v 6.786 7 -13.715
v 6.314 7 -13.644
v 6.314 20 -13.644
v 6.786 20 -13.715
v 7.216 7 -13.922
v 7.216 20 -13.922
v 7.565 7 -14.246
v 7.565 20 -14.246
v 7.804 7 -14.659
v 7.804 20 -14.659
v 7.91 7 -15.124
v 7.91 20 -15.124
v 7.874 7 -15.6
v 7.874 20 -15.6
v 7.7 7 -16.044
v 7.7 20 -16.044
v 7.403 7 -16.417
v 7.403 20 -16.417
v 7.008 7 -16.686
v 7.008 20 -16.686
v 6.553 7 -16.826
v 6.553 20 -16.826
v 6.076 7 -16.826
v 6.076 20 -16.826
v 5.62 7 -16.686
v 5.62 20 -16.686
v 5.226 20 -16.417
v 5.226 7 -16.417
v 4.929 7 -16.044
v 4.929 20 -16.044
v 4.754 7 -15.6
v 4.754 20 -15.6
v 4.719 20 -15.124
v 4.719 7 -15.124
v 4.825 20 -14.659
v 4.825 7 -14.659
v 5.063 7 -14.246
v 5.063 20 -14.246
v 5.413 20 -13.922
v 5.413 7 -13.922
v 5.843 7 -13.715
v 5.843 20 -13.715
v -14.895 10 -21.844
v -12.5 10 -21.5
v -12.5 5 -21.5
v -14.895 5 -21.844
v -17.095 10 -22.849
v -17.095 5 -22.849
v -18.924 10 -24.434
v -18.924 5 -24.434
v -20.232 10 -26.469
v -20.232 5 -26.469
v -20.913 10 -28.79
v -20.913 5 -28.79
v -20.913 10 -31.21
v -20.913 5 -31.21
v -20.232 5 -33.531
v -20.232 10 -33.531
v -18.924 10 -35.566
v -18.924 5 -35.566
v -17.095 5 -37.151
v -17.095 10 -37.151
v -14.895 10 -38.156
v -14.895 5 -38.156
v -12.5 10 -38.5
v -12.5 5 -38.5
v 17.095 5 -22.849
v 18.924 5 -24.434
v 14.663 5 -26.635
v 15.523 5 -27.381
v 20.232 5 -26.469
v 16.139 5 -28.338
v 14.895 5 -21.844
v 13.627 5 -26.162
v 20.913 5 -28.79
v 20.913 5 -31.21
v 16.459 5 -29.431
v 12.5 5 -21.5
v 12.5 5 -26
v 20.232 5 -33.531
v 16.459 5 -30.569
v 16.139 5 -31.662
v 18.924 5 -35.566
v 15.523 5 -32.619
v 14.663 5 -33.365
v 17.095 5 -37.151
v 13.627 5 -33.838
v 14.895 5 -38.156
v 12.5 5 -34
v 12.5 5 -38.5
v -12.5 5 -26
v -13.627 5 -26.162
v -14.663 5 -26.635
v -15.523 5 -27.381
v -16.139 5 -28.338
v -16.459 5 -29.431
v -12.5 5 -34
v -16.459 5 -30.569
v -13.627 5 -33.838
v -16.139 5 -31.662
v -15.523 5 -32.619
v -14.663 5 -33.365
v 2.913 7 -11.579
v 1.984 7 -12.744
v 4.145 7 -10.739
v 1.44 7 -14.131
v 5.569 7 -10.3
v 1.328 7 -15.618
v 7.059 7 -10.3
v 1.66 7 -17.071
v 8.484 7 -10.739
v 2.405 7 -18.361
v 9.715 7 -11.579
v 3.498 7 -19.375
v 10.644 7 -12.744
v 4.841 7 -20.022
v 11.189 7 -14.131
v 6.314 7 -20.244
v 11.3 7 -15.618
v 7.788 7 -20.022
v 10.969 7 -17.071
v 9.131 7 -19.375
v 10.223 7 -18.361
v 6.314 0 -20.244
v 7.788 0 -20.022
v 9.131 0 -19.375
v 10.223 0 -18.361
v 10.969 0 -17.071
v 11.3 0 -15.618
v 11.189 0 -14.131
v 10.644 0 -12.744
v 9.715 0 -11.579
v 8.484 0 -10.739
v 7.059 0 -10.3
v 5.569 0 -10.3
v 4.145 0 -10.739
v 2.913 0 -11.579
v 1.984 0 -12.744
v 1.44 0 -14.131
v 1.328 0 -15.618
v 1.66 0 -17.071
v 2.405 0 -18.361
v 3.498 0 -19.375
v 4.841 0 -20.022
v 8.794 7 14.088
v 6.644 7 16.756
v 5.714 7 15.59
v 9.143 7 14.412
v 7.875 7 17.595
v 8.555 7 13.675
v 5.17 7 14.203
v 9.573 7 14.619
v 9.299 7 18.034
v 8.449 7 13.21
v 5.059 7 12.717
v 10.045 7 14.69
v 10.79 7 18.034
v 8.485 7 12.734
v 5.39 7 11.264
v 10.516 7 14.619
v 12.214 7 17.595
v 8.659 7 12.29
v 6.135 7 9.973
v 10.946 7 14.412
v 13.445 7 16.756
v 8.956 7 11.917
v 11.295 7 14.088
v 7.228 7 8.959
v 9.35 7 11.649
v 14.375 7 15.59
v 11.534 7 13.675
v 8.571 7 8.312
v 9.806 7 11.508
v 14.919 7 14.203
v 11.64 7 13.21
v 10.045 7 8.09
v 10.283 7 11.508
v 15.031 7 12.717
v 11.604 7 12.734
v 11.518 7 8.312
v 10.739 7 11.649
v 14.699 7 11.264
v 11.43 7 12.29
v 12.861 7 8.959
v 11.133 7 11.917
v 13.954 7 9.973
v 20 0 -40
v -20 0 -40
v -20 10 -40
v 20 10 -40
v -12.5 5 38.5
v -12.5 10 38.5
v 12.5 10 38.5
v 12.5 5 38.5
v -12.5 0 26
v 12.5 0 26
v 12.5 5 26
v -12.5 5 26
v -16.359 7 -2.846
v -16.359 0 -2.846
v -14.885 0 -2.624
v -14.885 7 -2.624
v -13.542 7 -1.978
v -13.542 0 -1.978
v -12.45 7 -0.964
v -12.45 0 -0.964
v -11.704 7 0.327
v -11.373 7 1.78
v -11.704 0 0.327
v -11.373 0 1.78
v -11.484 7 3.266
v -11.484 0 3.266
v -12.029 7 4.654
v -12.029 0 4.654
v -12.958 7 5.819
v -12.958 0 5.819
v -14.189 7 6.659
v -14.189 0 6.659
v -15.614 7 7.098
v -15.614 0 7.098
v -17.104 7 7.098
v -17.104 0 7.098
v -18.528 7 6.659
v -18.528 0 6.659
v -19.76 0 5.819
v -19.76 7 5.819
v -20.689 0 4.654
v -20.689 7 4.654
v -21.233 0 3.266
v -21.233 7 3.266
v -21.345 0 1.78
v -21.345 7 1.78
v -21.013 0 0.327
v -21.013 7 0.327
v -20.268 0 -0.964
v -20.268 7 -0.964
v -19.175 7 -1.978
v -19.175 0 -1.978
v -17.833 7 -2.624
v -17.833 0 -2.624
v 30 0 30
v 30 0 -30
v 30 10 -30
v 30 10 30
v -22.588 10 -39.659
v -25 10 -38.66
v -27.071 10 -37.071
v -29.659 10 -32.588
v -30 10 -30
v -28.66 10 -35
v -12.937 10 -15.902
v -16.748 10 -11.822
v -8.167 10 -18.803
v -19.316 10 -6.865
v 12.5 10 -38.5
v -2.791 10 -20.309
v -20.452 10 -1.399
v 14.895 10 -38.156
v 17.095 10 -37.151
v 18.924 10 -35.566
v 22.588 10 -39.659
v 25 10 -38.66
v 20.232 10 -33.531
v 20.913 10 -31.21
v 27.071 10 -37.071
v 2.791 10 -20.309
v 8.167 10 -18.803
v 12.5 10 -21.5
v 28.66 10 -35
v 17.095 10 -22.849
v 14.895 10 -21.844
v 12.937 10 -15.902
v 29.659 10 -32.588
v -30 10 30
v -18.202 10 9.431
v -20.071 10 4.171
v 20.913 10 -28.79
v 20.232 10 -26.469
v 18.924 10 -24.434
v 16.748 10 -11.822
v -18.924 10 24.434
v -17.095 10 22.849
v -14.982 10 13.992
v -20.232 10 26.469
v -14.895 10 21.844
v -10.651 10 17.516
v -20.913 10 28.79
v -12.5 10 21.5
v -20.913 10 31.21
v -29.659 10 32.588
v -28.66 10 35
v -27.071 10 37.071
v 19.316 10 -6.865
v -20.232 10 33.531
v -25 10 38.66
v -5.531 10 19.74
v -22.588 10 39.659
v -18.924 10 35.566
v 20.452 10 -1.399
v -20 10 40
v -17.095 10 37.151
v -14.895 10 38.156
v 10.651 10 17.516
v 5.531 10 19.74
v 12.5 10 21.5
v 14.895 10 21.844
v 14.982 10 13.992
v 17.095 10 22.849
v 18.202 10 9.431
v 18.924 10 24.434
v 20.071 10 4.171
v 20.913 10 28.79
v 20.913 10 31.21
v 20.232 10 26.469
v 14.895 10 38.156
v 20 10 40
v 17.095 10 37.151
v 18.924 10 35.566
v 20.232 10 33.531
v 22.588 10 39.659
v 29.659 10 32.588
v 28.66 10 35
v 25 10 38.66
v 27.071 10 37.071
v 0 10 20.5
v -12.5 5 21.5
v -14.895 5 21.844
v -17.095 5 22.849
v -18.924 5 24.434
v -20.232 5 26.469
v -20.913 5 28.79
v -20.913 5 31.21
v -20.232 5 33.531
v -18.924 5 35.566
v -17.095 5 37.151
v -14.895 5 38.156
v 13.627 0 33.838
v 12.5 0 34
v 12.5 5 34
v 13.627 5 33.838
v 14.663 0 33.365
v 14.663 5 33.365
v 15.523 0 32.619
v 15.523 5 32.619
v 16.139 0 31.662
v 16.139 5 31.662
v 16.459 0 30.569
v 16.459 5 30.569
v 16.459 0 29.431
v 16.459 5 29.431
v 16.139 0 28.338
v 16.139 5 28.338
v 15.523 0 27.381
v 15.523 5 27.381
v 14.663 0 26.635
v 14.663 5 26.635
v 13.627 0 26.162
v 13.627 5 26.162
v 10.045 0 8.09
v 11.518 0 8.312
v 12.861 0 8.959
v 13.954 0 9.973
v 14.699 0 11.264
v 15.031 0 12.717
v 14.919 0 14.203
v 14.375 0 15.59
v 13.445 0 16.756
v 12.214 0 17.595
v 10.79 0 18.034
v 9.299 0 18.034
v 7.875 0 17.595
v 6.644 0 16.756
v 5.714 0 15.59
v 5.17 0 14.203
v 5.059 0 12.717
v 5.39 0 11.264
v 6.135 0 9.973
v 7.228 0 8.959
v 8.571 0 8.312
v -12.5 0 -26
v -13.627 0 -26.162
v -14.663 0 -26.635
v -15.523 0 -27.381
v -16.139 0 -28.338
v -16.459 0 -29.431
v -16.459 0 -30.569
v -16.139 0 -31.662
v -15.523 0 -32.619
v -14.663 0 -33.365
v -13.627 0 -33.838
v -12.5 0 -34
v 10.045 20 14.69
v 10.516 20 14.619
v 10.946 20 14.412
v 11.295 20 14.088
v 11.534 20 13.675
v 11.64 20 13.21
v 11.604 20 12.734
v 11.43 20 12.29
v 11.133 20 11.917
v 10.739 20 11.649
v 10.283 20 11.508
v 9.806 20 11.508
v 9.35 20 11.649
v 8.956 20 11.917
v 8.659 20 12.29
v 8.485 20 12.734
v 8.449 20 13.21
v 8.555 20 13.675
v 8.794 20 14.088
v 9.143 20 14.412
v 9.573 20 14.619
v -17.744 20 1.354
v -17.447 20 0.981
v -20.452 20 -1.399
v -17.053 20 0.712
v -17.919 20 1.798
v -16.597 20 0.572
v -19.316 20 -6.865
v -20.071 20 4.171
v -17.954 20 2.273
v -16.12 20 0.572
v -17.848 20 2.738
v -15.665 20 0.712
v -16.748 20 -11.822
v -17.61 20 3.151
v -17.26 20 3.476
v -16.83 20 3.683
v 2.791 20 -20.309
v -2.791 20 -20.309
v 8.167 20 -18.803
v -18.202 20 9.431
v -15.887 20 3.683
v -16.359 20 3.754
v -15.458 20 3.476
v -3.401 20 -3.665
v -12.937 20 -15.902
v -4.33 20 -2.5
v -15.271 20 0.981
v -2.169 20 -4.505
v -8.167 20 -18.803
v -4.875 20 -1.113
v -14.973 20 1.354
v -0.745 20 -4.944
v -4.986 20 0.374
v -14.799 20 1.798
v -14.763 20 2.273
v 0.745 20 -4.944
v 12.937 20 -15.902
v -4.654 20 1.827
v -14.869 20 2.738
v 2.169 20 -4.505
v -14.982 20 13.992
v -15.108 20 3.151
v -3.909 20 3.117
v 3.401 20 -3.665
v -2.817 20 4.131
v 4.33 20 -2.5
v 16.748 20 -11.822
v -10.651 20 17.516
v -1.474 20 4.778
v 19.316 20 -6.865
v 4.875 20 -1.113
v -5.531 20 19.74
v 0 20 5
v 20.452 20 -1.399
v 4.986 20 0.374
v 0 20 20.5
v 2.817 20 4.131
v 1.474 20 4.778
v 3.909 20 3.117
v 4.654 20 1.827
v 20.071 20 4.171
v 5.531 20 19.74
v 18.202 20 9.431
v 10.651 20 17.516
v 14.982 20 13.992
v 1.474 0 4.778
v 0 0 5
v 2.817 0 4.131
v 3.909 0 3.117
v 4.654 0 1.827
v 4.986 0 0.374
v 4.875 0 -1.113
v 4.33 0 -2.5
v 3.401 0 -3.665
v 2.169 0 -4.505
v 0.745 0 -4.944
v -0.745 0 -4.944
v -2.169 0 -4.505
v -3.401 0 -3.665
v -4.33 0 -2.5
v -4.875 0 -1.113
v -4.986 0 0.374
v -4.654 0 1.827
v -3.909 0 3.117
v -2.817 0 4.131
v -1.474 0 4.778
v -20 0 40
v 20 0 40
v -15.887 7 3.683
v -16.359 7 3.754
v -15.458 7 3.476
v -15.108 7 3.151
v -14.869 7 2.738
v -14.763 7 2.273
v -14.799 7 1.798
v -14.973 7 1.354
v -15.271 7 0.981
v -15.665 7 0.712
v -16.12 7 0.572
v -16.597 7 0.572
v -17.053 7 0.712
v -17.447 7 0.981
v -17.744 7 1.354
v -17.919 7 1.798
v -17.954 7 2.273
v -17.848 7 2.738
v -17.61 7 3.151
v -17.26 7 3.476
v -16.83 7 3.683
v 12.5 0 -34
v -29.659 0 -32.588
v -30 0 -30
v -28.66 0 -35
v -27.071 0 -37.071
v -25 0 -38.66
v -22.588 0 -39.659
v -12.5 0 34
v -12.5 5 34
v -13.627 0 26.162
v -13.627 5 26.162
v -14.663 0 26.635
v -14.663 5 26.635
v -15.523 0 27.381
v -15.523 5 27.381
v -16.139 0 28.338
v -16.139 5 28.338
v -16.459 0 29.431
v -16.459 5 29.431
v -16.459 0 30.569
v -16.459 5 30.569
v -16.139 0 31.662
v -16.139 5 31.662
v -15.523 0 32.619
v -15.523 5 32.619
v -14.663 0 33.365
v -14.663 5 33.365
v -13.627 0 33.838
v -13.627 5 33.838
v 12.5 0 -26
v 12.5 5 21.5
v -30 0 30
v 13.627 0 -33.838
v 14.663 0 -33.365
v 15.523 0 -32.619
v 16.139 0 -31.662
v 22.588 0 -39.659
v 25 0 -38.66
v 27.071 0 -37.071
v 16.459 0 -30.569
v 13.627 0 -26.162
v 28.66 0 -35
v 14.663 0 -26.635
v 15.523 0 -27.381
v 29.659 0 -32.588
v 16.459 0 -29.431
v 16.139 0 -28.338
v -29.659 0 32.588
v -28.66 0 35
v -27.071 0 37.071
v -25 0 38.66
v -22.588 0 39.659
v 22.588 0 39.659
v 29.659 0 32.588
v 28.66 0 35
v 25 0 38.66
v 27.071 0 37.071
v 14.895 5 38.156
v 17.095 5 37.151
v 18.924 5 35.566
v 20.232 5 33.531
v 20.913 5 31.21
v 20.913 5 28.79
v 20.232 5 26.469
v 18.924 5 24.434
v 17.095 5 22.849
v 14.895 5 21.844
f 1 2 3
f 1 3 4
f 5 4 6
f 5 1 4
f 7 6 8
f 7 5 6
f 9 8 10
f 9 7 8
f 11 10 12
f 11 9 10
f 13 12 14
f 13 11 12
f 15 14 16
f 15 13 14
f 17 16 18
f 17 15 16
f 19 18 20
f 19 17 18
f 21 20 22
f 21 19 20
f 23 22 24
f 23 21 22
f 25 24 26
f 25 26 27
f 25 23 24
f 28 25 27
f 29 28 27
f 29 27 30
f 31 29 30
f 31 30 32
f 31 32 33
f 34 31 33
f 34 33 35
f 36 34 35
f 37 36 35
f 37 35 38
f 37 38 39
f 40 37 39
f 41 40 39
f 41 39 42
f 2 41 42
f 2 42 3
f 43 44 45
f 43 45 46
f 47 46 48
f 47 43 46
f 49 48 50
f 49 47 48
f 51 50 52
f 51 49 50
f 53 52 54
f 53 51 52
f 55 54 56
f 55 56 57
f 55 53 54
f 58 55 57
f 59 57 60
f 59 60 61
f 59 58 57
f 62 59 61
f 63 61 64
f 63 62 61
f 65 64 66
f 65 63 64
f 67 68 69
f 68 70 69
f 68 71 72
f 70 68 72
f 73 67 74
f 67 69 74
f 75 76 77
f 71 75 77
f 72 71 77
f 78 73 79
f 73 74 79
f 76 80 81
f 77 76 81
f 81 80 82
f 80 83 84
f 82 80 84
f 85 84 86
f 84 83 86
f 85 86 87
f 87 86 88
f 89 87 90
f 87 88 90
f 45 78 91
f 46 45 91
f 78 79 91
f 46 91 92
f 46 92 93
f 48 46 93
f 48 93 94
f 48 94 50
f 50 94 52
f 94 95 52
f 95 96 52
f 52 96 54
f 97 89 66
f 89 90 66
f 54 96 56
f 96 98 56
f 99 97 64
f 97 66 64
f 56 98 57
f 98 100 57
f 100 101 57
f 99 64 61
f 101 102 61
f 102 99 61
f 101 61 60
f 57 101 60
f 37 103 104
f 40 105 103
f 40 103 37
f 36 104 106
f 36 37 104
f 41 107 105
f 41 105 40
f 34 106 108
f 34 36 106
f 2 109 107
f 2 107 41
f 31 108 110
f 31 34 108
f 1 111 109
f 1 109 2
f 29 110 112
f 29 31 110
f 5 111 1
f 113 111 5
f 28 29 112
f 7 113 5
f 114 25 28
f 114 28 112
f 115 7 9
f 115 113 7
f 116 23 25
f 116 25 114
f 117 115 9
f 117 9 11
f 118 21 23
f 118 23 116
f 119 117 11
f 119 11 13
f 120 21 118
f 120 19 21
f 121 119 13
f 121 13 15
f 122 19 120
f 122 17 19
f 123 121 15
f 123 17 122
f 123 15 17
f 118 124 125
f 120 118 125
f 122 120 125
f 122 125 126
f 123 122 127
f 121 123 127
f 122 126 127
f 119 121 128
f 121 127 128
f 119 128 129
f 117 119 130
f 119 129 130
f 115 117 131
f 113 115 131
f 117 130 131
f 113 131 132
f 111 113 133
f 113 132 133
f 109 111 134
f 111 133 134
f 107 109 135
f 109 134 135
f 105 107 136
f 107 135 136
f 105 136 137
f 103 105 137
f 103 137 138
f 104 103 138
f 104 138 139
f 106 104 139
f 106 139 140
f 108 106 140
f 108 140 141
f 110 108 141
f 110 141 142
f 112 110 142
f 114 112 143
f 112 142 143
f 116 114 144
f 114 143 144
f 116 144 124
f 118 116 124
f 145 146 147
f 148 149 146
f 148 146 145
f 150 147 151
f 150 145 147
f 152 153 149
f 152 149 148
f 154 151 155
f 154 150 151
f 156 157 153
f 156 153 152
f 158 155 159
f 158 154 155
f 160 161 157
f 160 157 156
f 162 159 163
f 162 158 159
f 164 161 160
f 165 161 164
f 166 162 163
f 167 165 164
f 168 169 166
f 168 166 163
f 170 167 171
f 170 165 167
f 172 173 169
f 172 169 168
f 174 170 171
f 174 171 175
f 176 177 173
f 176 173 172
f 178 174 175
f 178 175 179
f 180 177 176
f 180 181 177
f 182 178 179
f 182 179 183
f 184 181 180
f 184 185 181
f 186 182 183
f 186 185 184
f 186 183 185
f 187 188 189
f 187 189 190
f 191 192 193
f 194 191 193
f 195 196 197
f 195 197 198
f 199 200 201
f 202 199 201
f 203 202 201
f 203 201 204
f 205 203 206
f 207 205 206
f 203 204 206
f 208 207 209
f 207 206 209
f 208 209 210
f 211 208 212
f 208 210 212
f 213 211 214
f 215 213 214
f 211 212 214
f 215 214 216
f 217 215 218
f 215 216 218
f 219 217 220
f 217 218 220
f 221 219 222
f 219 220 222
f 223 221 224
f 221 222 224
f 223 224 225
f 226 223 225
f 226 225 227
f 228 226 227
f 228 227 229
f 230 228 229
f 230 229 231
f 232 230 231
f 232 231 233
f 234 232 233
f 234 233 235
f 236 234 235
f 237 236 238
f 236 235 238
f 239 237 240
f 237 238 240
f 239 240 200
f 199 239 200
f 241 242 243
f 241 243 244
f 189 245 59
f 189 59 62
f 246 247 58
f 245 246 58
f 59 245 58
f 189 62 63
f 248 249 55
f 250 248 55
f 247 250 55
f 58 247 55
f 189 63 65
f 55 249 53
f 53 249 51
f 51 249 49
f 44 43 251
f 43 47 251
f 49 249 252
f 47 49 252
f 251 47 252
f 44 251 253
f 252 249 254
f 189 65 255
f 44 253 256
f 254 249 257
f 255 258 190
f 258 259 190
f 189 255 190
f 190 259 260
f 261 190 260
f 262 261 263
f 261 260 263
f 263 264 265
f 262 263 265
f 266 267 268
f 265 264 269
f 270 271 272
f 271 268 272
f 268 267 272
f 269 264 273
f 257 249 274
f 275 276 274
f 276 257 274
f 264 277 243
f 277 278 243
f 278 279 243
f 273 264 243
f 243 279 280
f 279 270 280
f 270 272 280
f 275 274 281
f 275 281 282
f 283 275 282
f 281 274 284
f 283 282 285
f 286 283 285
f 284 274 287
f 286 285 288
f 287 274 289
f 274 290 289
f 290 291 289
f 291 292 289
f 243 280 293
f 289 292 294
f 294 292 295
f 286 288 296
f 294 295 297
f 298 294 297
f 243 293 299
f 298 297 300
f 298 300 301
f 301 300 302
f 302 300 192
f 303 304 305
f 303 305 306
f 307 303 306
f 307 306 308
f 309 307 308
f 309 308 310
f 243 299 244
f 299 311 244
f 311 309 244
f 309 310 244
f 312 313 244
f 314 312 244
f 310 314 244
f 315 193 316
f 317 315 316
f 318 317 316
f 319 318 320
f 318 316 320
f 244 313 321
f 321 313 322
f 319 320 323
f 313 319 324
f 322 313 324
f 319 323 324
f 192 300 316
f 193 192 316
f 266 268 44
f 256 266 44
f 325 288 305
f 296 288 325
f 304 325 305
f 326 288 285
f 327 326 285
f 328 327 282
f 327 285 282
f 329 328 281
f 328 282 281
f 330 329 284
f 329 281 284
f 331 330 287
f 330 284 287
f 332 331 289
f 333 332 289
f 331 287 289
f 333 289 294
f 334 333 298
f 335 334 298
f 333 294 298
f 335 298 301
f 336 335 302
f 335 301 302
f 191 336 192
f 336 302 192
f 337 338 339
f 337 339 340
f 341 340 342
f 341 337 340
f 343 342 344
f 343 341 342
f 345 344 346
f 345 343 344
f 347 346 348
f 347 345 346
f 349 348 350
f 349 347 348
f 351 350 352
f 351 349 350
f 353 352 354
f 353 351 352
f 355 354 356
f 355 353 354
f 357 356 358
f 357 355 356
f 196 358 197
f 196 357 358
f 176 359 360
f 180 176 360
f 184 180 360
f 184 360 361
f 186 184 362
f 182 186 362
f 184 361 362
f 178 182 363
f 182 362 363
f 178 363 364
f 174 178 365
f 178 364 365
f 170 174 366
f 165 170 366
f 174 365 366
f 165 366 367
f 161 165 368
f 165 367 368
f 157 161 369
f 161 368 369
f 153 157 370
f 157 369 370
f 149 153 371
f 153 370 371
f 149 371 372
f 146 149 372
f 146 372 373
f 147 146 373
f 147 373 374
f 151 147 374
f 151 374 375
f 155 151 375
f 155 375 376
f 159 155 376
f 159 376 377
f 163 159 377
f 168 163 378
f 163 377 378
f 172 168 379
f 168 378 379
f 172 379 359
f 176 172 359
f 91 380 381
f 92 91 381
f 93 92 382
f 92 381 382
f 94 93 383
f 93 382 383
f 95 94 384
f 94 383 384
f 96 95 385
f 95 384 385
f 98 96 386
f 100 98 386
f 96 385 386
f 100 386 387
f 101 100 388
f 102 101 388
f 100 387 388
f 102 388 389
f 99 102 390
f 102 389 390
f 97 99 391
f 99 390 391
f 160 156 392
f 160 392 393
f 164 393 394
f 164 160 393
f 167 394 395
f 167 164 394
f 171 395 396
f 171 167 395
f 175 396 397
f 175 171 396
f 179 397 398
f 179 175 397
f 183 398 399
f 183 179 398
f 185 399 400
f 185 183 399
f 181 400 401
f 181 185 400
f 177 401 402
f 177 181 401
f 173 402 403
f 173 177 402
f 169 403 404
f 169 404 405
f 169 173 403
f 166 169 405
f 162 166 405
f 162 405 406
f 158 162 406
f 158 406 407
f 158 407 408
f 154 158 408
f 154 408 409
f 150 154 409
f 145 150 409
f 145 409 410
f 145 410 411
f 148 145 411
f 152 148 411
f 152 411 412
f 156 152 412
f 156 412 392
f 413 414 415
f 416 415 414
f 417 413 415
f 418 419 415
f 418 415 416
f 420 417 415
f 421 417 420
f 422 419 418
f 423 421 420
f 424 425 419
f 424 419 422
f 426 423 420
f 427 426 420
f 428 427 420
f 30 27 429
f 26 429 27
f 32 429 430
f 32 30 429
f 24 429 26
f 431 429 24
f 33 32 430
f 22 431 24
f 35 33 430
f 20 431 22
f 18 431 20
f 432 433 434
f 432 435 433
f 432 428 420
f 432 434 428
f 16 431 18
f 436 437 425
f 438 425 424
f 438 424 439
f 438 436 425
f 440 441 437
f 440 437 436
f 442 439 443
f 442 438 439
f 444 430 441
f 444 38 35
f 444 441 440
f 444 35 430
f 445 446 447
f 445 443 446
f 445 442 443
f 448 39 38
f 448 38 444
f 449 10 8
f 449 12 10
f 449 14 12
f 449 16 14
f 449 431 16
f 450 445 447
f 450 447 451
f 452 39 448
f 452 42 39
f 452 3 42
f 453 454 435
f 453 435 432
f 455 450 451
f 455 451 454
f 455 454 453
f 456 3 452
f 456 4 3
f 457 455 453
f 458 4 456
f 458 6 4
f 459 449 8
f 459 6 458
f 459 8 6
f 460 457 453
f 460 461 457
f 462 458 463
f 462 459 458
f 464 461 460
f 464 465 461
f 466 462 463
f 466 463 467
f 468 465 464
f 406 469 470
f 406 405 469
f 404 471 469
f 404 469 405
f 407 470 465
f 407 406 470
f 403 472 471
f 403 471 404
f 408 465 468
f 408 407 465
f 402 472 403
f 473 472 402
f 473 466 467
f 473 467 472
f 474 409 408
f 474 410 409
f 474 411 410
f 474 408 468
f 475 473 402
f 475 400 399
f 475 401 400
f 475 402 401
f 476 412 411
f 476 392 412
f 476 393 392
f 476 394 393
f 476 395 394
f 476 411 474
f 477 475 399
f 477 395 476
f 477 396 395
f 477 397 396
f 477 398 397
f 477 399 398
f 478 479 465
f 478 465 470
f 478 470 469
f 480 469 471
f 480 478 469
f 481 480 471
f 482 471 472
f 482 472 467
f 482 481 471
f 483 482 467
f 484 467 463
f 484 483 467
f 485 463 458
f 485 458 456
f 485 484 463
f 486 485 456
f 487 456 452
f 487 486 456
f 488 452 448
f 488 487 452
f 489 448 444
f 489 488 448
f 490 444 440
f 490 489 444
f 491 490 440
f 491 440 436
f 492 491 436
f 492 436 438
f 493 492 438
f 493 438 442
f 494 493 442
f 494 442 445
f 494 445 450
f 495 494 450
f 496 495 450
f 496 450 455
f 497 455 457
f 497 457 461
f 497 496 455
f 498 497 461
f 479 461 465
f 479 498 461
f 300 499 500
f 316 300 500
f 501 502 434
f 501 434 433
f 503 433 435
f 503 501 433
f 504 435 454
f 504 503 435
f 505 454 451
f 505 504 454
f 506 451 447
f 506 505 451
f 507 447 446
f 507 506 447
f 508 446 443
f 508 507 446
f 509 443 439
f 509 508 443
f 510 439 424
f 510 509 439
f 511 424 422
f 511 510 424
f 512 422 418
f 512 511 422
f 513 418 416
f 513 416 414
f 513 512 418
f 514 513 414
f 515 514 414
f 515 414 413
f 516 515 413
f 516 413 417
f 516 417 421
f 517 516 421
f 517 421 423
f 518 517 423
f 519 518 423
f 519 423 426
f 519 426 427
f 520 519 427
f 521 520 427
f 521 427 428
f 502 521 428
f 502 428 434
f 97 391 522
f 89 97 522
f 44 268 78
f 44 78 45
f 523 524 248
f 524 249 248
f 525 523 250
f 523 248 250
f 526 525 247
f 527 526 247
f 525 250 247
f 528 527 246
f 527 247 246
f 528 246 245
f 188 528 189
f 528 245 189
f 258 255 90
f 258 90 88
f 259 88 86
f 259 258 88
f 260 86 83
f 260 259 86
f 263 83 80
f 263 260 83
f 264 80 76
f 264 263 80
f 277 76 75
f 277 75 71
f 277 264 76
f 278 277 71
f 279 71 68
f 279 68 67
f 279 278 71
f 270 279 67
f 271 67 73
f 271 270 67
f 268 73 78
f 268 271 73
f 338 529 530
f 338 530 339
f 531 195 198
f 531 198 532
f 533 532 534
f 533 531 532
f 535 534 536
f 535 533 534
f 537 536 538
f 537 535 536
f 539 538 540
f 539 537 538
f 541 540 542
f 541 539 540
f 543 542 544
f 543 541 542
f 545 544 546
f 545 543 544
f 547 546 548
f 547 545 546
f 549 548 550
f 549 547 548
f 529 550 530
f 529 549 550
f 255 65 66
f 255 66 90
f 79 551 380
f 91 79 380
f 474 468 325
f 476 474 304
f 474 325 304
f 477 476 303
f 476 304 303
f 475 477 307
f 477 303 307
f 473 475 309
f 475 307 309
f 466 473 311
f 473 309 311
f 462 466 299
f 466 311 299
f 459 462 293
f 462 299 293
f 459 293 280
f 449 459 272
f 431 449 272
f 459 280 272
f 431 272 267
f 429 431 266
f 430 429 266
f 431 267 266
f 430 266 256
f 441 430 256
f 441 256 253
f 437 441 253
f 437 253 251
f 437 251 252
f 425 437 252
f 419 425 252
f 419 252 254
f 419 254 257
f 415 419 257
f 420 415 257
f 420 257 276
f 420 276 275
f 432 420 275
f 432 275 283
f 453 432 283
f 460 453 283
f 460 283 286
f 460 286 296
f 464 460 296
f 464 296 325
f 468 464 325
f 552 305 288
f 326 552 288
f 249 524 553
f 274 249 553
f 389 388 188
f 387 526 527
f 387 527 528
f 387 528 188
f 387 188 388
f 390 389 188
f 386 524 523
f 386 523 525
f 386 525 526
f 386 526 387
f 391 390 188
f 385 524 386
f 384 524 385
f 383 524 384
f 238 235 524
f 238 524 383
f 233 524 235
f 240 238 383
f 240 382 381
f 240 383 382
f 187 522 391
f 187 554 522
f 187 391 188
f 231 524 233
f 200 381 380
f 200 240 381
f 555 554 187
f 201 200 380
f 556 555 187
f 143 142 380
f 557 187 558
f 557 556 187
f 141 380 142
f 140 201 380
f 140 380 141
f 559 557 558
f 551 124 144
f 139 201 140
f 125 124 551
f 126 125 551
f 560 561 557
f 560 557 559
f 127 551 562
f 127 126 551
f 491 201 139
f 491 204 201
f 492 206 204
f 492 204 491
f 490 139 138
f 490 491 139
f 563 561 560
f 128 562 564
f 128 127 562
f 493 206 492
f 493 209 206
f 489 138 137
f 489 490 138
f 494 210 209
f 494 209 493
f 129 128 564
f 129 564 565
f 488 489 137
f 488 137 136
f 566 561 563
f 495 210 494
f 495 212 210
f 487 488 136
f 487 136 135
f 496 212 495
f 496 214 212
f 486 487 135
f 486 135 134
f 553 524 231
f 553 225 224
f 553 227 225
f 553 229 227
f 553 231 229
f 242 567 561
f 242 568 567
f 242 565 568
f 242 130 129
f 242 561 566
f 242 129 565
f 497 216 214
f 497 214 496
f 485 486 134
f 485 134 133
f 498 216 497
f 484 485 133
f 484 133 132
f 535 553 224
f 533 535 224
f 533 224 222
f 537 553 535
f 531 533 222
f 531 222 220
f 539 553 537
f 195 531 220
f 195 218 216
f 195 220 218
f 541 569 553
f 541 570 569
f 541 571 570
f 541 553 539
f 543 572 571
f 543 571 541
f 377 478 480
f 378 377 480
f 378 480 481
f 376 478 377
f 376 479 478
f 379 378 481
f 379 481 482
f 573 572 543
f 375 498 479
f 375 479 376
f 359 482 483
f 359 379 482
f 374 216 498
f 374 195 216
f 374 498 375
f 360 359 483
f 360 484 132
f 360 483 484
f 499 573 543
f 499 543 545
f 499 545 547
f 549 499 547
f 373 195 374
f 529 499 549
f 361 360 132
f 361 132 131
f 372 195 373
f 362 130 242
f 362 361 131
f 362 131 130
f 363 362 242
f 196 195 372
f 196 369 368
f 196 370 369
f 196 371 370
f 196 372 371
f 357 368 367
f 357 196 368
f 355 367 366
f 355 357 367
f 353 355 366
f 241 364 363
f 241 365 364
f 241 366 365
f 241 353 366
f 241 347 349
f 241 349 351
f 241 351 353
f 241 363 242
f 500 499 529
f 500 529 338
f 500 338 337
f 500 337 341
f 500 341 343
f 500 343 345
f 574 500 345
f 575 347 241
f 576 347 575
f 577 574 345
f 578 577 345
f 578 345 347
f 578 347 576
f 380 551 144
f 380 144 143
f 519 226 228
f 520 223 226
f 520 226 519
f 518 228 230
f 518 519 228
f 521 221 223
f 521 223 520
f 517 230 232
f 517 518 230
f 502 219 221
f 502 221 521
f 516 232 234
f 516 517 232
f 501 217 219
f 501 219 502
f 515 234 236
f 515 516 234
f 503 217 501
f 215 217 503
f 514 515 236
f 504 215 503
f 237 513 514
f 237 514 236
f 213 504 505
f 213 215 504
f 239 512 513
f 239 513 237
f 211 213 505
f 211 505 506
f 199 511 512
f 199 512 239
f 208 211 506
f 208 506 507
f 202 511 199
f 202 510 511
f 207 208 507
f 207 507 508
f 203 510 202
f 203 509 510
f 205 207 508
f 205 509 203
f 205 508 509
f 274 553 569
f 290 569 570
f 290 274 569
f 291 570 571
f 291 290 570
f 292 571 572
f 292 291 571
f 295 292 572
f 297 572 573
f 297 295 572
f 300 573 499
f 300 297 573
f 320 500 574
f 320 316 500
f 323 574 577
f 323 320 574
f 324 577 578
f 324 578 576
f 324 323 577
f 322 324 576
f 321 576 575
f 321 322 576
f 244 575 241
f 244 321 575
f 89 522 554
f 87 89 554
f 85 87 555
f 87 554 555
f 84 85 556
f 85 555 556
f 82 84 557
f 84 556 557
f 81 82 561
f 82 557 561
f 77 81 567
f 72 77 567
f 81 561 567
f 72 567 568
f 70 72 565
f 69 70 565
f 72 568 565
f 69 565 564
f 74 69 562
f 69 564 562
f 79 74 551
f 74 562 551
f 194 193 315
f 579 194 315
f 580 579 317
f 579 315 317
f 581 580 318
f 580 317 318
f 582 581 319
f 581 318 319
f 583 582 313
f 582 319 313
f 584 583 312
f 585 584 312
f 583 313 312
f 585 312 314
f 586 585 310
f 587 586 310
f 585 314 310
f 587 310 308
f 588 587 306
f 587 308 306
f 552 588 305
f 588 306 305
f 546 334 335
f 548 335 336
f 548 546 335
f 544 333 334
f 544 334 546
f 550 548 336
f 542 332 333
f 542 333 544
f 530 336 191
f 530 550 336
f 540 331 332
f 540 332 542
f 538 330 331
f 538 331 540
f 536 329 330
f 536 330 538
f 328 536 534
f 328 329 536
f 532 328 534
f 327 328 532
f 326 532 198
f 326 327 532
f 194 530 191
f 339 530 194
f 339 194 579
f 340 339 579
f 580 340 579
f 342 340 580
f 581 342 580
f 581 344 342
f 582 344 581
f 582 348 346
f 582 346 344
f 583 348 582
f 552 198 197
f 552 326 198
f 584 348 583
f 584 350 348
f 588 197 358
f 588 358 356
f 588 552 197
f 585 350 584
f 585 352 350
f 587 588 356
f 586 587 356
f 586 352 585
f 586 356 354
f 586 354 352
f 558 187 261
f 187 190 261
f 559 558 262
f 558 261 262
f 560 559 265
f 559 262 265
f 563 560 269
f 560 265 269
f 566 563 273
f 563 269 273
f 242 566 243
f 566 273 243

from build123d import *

# Parameters (mm, degrees)
SKETCH1_R           = 20.5
SKETCH1_R_2         = 1.6
SKETCH1_R_3         = 5
BOSS_EXTRUDE1_DEPTH = 20
SKETCH2_W           = 60
SKETCH2_H           = 80
SKETCH2_R           = 20.5
BOSS_EXTRUDE2_DEPTH = 10
CUT_EXTRUDE1_DEPTH  = 5
FILLET1_R           = 10
SKETCH4_R           = 5
CUT_EXTRUDE2_DEPTH  = 7


with BuildPart() as part:
    # Sketch1 → Boss-Extrude1 (new body)
    with BuildSketch(Plane(origin=(0, 0, 0), x_dir=(1, 0, 0), z_dir=(0, 1, 0))):
        with Locations(Location((0, 0, 0), (0, 0, 270))):
            Circle(SKETCH1_R)
        with Locations(Location((6.314276634, 15.244012286, 0), (0, 0, 270))):
            Circle(SKETCH1_R_2, mode=Mode.SUBTRACT)
        with Locations(Location((10.044563579, -13.090330115, 0), (0, 0, 270))):
            Circle(SKETCH1_R_2, mode=Mode.SUBTRACT)
        with Locations(Location((-16.358840213, -2.153682172, 0), (0, 0, 270))):
            Circle(SKETCH1_R_2, mode=Mode.SUBTRACT)
        with Locations(Location((0, 0, 0), (0, 0, 270))):
            Circle(SKETCH1_R_3, mode=Mode.SUBTRACT)
    extrude(amount=BOSS_EXTRUDE1_DEPTH)

    # Sketch2 → Boss-Extrude2 (add)
    with BuildSketch(Plane.XZ):
        Rectangle(SKETCH2_W, SKETCH2_H)
        with Locations(Location((0, 0, 0), (0, 0, 270))):
            Circle(SKETCH2_R, mode=Mode.SUBTRACT)
        with BuildLine():
            Line((-12.5, 34), (12.5, 34))
            ThreePointArc((12.5, 34), (16.5, 30), (12.5, 26))
            Line((12.5, 26), (-12.5, 26))
            ThreePointArc((-12.5, 26), (-16.5, 30), (-12.5, 34))
        make_face(mode=Mode.SUBTRACT)
        with BuildLine():
            Line((-12.5, -34), (12.5, -34))
            ThreePointArc((12.5, -34), (16.5, -30), (12.5, -26))
            Line((12.5, -26), (-12.5, -26))
            ThreePointArc((-12.5, -26), (-16.5, -30), (-12.5, -34))
        make_face(mode=Mode.SUBTRACT)
    extrude(amount=-BOSS_EXTRUDE2_DEPTH)

    # Sketch3 → Cut-Extrude1 (cut)
    with BuildSketch(Plane(origin=(0, 10, 0), x_dir=(1, 0, 0), z_dir=(0, 1, 0))):
        with BuildLine():
            Line((-12.5, 38.5), (12.5, 38.5))
            ThreePointArc((12.5, 38.5), (21, 30), (12.5, 21.5))
            Line((12.5, 21.5), (-12.5, 21.5))
            ThreePointArc((-12.5, 21.5), (-21, 30), (-12.5, 38.5))
        make_face()
        with BuildLine():
            Line((-12.5, -38.5), (12.5, -38.5))
            ThreePointArc((12.5, -38.5), (21, -30), (12.5, -21.5))
            Line((12.5, -21.5), (-12.5, -21.5))
            ThreePointArc((-12.5, -21.5), (-21, -30), (-12.5, -38.5))
        make_face()
    extrude(amount=-CUT_EXTRUDE1_DEPTH, mode=Mode.SUBTRACT)

    # Fillet1
    fillet1_edges = [part.edges().sort_by_distance(p)[0] for p in [
        (30, 5, 40),
        (30, 5, -40),
        (-30, 5, -40),
        (-30, 5, 40),
    ]]
    fillet(fillet1_edges, radius=FILLET1_R)

    # Sketch4 → Cut-Extrude2 (cut)
    with BuildSketch(Plane.XZ):
        with Locations(Location((10.044563579, 13.090330115, 0), (0, 0, 270))):
            Circle(SKETCH4_R)
        with Locations(Location((6.314276634, -15.244012286, 0), (0, 0, 270))):
            Circle(SKETCH4_R)
        with Locations(Location((-16.358840213, 2.153682172, 0), (0, 0, 270))):
            Circle(SKETCH4_R)
    extrude(amount=-CUT_EXTRUDE2_DEPTH, mode=Mode.SUBTRACT)


solid = part.part
